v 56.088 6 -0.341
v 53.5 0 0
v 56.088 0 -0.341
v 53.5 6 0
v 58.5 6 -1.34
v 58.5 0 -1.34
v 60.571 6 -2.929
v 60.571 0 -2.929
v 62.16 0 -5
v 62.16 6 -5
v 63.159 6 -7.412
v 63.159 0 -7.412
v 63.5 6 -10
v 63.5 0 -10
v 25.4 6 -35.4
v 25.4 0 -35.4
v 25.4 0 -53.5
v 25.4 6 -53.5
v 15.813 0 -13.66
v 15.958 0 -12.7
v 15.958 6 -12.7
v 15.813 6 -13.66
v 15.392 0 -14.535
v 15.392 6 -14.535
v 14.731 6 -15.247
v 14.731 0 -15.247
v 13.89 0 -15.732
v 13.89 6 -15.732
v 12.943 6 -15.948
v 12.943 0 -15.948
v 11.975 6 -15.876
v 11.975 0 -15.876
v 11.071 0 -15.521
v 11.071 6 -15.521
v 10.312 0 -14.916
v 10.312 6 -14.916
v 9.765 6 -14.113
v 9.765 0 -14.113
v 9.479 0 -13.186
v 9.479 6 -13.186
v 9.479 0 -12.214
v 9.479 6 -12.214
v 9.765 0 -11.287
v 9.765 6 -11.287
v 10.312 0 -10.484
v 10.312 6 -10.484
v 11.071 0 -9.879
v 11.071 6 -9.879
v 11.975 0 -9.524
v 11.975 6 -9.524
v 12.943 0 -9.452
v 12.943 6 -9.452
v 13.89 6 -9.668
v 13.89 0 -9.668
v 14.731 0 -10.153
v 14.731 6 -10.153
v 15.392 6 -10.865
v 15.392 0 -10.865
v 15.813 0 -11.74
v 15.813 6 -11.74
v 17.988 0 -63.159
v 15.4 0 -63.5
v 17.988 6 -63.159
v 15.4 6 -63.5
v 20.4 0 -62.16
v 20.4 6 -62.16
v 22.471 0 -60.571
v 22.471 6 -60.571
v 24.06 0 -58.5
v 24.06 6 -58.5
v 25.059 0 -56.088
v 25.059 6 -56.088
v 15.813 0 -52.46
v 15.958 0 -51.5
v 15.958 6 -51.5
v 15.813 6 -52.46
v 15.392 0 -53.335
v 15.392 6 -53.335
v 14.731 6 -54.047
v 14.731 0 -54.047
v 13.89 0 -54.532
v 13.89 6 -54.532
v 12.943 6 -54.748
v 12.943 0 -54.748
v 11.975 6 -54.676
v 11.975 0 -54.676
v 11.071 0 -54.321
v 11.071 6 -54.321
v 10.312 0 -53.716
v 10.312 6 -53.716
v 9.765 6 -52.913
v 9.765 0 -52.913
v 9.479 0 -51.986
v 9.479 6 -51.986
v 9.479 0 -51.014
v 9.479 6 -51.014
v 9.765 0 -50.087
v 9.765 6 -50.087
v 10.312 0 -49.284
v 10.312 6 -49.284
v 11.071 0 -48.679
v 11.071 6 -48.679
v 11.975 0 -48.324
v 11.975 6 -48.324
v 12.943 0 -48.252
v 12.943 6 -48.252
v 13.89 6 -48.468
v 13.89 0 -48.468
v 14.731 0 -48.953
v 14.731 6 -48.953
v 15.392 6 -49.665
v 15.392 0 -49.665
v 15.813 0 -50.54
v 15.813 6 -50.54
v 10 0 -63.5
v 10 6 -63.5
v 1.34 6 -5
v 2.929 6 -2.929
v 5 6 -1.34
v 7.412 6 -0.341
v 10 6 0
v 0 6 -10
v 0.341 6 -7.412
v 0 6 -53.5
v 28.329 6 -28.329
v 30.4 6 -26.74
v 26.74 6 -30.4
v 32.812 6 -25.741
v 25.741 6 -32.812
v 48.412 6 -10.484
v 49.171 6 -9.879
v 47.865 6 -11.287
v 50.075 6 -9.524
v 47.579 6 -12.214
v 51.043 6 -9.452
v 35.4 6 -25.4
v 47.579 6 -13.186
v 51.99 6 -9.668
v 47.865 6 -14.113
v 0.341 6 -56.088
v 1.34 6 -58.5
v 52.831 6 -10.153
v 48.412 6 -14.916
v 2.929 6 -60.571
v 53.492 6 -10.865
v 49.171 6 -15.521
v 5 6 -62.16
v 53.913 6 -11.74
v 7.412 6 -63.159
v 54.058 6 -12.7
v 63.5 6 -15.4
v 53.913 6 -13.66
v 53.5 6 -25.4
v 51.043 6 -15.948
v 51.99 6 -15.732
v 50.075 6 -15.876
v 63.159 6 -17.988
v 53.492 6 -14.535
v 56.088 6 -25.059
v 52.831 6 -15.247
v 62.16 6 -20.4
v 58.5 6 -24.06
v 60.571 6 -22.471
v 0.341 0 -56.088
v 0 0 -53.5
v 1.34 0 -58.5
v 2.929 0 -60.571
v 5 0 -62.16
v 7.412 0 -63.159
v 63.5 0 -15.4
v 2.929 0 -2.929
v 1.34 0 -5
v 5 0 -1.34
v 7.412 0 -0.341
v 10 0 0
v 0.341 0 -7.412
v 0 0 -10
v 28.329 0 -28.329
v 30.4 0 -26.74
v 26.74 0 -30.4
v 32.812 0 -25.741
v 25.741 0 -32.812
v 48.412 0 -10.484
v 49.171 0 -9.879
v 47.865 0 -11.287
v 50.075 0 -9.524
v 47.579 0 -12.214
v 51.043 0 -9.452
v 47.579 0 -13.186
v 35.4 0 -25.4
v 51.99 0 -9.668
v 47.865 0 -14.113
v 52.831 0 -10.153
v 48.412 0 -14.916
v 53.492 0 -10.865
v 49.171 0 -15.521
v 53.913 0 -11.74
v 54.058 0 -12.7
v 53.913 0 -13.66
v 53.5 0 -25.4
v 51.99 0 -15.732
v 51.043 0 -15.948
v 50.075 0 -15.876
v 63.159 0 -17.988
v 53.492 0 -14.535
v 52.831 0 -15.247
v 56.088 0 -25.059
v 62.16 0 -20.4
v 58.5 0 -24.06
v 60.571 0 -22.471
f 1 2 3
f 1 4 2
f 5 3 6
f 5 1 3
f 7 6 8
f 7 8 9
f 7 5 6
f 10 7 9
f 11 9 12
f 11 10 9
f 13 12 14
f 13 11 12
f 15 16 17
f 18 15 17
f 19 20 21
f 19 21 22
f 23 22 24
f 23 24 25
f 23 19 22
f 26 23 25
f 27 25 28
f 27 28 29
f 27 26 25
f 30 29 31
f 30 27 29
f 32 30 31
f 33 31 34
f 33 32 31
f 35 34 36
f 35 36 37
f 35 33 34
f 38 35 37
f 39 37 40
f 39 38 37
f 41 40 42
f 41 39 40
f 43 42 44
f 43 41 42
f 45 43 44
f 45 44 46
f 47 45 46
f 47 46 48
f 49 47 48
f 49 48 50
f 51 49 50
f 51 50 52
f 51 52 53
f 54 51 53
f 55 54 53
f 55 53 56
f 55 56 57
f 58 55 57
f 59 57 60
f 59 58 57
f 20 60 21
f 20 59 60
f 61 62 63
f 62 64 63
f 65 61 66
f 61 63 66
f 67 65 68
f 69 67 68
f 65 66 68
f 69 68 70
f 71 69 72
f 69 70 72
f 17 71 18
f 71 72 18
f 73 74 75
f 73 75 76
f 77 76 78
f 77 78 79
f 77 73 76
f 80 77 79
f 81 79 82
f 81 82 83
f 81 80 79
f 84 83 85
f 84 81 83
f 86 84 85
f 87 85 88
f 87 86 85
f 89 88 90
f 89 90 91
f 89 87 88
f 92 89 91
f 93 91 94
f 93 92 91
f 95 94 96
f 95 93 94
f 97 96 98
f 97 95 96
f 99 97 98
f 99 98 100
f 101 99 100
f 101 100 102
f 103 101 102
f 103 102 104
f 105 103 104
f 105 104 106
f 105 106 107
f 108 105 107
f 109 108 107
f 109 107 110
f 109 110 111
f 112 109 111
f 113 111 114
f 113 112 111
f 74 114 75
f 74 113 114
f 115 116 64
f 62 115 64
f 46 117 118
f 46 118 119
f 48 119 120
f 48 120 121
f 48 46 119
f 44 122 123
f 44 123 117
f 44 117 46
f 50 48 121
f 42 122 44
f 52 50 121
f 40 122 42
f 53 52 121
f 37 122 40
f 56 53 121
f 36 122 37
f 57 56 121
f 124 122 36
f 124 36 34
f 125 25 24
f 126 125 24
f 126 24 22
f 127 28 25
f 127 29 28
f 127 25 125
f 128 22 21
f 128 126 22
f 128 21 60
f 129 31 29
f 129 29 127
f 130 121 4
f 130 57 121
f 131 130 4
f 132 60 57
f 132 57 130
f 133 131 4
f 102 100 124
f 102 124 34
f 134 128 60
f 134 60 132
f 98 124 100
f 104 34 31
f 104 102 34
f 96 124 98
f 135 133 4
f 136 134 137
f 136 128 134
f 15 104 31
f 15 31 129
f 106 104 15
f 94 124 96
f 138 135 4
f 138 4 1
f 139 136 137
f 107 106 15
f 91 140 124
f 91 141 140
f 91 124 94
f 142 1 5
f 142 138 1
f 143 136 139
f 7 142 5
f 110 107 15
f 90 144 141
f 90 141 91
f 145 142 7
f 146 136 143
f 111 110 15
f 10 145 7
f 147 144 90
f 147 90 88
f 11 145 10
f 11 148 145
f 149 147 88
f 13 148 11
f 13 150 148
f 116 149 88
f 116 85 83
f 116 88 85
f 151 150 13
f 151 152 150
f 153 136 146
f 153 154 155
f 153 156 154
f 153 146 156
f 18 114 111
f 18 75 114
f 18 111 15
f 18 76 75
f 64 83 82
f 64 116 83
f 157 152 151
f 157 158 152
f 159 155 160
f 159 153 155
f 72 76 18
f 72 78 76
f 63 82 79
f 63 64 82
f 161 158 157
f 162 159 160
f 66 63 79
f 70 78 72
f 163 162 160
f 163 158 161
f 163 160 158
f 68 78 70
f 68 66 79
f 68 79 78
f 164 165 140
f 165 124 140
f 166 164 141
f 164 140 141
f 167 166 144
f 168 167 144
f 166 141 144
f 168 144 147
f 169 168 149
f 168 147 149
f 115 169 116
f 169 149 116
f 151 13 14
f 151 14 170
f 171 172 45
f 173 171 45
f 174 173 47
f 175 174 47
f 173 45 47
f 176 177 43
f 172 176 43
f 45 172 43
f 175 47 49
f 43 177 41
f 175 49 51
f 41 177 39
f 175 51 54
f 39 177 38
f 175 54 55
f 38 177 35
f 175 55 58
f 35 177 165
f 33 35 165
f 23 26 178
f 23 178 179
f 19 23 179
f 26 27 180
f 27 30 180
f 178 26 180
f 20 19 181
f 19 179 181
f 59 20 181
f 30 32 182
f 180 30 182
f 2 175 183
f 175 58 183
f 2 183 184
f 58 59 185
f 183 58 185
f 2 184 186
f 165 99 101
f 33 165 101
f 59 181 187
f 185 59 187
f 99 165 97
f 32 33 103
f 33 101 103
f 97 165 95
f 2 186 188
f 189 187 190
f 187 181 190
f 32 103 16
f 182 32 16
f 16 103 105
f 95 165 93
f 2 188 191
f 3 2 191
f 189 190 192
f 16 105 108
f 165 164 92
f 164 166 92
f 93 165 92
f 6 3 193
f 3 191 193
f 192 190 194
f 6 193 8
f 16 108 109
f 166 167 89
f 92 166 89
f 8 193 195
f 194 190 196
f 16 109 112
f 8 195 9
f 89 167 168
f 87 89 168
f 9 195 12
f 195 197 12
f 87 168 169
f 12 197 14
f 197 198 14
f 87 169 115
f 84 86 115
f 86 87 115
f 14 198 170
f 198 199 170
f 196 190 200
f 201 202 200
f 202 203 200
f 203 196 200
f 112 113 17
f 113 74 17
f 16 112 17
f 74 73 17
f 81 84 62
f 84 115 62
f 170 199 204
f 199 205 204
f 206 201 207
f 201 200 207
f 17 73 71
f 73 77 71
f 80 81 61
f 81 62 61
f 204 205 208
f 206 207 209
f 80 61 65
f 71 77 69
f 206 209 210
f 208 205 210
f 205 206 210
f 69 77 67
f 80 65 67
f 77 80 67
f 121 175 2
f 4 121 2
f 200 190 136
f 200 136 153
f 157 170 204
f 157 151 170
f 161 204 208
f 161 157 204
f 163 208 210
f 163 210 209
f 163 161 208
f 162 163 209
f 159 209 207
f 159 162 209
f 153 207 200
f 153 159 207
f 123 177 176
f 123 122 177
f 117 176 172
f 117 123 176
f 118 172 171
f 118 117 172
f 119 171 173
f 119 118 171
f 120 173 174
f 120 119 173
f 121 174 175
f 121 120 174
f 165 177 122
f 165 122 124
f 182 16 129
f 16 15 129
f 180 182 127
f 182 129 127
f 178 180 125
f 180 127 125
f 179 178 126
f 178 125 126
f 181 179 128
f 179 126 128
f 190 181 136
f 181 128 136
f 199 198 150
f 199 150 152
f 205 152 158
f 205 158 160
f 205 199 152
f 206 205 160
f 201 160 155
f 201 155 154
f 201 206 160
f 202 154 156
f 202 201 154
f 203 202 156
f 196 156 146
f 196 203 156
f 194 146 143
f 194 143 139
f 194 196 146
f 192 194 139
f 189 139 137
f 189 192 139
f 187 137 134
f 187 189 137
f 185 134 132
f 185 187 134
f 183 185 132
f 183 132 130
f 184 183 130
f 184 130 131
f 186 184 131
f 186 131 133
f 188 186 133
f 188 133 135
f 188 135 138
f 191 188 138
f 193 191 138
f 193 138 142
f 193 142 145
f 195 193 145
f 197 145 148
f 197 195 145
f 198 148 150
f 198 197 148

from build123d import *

# Parameters (mm, degrees)
SKETCH1_W           = 25.4
SKETCH1_H           = 63.5
SKETCH1_R           = 3.25755
SKETCH1_W_2         = 38.1
SKETCH1_H_2         = 25.4
BOSS_EXTRUDE1_DEPTH = 6
FILLET1_R           = 10


with BuildPart() as part:
    # Sketch1 → Boss-Extrude1 (new body)
    with BuildSketch(Plane(origin=(0, 0, 0), x_dir=(1, 0, 0), z_dir=(0, 1, 0))):
        with Locations((12.7, 31.75)):
            Rectangle(SKETCH1_W, SKETCH1_H)
        with Locations((12.7, 12.7)):
            Circle(SKETCH1_R, mode=Mode.SUBTRACT)
        with Locations((12.7, 51.5)):
            Circle(SKETCH1_R, mode=Mode.SUBTRACT)
        with Locations((44.45, 12.7)):
            Rectangle(SKETCH1_W_2, SKETCH1_H_2)
        with Locations((50.8, 12.7)):
            Circle(SKETCH1_R, mode=Mode.SUBTRACT)
    extrude(amount=BOSS_EXTRUDE1_DEPTH)

    # Fillet1
    fillet1_edges = [part.edges().sort_by_distance(p)[0] for p in [
        (0, 3, 0),
        (0, 3, -63.5),
        (25.4, 3, -63.5),
        (25.4, 3, -25.4),
        (63.5, 3, -25.4),
        (63.5, 3, 0),
    ]]
    fillet(fillet1_edges, radius=FILLET1_R)


solid = part.part
